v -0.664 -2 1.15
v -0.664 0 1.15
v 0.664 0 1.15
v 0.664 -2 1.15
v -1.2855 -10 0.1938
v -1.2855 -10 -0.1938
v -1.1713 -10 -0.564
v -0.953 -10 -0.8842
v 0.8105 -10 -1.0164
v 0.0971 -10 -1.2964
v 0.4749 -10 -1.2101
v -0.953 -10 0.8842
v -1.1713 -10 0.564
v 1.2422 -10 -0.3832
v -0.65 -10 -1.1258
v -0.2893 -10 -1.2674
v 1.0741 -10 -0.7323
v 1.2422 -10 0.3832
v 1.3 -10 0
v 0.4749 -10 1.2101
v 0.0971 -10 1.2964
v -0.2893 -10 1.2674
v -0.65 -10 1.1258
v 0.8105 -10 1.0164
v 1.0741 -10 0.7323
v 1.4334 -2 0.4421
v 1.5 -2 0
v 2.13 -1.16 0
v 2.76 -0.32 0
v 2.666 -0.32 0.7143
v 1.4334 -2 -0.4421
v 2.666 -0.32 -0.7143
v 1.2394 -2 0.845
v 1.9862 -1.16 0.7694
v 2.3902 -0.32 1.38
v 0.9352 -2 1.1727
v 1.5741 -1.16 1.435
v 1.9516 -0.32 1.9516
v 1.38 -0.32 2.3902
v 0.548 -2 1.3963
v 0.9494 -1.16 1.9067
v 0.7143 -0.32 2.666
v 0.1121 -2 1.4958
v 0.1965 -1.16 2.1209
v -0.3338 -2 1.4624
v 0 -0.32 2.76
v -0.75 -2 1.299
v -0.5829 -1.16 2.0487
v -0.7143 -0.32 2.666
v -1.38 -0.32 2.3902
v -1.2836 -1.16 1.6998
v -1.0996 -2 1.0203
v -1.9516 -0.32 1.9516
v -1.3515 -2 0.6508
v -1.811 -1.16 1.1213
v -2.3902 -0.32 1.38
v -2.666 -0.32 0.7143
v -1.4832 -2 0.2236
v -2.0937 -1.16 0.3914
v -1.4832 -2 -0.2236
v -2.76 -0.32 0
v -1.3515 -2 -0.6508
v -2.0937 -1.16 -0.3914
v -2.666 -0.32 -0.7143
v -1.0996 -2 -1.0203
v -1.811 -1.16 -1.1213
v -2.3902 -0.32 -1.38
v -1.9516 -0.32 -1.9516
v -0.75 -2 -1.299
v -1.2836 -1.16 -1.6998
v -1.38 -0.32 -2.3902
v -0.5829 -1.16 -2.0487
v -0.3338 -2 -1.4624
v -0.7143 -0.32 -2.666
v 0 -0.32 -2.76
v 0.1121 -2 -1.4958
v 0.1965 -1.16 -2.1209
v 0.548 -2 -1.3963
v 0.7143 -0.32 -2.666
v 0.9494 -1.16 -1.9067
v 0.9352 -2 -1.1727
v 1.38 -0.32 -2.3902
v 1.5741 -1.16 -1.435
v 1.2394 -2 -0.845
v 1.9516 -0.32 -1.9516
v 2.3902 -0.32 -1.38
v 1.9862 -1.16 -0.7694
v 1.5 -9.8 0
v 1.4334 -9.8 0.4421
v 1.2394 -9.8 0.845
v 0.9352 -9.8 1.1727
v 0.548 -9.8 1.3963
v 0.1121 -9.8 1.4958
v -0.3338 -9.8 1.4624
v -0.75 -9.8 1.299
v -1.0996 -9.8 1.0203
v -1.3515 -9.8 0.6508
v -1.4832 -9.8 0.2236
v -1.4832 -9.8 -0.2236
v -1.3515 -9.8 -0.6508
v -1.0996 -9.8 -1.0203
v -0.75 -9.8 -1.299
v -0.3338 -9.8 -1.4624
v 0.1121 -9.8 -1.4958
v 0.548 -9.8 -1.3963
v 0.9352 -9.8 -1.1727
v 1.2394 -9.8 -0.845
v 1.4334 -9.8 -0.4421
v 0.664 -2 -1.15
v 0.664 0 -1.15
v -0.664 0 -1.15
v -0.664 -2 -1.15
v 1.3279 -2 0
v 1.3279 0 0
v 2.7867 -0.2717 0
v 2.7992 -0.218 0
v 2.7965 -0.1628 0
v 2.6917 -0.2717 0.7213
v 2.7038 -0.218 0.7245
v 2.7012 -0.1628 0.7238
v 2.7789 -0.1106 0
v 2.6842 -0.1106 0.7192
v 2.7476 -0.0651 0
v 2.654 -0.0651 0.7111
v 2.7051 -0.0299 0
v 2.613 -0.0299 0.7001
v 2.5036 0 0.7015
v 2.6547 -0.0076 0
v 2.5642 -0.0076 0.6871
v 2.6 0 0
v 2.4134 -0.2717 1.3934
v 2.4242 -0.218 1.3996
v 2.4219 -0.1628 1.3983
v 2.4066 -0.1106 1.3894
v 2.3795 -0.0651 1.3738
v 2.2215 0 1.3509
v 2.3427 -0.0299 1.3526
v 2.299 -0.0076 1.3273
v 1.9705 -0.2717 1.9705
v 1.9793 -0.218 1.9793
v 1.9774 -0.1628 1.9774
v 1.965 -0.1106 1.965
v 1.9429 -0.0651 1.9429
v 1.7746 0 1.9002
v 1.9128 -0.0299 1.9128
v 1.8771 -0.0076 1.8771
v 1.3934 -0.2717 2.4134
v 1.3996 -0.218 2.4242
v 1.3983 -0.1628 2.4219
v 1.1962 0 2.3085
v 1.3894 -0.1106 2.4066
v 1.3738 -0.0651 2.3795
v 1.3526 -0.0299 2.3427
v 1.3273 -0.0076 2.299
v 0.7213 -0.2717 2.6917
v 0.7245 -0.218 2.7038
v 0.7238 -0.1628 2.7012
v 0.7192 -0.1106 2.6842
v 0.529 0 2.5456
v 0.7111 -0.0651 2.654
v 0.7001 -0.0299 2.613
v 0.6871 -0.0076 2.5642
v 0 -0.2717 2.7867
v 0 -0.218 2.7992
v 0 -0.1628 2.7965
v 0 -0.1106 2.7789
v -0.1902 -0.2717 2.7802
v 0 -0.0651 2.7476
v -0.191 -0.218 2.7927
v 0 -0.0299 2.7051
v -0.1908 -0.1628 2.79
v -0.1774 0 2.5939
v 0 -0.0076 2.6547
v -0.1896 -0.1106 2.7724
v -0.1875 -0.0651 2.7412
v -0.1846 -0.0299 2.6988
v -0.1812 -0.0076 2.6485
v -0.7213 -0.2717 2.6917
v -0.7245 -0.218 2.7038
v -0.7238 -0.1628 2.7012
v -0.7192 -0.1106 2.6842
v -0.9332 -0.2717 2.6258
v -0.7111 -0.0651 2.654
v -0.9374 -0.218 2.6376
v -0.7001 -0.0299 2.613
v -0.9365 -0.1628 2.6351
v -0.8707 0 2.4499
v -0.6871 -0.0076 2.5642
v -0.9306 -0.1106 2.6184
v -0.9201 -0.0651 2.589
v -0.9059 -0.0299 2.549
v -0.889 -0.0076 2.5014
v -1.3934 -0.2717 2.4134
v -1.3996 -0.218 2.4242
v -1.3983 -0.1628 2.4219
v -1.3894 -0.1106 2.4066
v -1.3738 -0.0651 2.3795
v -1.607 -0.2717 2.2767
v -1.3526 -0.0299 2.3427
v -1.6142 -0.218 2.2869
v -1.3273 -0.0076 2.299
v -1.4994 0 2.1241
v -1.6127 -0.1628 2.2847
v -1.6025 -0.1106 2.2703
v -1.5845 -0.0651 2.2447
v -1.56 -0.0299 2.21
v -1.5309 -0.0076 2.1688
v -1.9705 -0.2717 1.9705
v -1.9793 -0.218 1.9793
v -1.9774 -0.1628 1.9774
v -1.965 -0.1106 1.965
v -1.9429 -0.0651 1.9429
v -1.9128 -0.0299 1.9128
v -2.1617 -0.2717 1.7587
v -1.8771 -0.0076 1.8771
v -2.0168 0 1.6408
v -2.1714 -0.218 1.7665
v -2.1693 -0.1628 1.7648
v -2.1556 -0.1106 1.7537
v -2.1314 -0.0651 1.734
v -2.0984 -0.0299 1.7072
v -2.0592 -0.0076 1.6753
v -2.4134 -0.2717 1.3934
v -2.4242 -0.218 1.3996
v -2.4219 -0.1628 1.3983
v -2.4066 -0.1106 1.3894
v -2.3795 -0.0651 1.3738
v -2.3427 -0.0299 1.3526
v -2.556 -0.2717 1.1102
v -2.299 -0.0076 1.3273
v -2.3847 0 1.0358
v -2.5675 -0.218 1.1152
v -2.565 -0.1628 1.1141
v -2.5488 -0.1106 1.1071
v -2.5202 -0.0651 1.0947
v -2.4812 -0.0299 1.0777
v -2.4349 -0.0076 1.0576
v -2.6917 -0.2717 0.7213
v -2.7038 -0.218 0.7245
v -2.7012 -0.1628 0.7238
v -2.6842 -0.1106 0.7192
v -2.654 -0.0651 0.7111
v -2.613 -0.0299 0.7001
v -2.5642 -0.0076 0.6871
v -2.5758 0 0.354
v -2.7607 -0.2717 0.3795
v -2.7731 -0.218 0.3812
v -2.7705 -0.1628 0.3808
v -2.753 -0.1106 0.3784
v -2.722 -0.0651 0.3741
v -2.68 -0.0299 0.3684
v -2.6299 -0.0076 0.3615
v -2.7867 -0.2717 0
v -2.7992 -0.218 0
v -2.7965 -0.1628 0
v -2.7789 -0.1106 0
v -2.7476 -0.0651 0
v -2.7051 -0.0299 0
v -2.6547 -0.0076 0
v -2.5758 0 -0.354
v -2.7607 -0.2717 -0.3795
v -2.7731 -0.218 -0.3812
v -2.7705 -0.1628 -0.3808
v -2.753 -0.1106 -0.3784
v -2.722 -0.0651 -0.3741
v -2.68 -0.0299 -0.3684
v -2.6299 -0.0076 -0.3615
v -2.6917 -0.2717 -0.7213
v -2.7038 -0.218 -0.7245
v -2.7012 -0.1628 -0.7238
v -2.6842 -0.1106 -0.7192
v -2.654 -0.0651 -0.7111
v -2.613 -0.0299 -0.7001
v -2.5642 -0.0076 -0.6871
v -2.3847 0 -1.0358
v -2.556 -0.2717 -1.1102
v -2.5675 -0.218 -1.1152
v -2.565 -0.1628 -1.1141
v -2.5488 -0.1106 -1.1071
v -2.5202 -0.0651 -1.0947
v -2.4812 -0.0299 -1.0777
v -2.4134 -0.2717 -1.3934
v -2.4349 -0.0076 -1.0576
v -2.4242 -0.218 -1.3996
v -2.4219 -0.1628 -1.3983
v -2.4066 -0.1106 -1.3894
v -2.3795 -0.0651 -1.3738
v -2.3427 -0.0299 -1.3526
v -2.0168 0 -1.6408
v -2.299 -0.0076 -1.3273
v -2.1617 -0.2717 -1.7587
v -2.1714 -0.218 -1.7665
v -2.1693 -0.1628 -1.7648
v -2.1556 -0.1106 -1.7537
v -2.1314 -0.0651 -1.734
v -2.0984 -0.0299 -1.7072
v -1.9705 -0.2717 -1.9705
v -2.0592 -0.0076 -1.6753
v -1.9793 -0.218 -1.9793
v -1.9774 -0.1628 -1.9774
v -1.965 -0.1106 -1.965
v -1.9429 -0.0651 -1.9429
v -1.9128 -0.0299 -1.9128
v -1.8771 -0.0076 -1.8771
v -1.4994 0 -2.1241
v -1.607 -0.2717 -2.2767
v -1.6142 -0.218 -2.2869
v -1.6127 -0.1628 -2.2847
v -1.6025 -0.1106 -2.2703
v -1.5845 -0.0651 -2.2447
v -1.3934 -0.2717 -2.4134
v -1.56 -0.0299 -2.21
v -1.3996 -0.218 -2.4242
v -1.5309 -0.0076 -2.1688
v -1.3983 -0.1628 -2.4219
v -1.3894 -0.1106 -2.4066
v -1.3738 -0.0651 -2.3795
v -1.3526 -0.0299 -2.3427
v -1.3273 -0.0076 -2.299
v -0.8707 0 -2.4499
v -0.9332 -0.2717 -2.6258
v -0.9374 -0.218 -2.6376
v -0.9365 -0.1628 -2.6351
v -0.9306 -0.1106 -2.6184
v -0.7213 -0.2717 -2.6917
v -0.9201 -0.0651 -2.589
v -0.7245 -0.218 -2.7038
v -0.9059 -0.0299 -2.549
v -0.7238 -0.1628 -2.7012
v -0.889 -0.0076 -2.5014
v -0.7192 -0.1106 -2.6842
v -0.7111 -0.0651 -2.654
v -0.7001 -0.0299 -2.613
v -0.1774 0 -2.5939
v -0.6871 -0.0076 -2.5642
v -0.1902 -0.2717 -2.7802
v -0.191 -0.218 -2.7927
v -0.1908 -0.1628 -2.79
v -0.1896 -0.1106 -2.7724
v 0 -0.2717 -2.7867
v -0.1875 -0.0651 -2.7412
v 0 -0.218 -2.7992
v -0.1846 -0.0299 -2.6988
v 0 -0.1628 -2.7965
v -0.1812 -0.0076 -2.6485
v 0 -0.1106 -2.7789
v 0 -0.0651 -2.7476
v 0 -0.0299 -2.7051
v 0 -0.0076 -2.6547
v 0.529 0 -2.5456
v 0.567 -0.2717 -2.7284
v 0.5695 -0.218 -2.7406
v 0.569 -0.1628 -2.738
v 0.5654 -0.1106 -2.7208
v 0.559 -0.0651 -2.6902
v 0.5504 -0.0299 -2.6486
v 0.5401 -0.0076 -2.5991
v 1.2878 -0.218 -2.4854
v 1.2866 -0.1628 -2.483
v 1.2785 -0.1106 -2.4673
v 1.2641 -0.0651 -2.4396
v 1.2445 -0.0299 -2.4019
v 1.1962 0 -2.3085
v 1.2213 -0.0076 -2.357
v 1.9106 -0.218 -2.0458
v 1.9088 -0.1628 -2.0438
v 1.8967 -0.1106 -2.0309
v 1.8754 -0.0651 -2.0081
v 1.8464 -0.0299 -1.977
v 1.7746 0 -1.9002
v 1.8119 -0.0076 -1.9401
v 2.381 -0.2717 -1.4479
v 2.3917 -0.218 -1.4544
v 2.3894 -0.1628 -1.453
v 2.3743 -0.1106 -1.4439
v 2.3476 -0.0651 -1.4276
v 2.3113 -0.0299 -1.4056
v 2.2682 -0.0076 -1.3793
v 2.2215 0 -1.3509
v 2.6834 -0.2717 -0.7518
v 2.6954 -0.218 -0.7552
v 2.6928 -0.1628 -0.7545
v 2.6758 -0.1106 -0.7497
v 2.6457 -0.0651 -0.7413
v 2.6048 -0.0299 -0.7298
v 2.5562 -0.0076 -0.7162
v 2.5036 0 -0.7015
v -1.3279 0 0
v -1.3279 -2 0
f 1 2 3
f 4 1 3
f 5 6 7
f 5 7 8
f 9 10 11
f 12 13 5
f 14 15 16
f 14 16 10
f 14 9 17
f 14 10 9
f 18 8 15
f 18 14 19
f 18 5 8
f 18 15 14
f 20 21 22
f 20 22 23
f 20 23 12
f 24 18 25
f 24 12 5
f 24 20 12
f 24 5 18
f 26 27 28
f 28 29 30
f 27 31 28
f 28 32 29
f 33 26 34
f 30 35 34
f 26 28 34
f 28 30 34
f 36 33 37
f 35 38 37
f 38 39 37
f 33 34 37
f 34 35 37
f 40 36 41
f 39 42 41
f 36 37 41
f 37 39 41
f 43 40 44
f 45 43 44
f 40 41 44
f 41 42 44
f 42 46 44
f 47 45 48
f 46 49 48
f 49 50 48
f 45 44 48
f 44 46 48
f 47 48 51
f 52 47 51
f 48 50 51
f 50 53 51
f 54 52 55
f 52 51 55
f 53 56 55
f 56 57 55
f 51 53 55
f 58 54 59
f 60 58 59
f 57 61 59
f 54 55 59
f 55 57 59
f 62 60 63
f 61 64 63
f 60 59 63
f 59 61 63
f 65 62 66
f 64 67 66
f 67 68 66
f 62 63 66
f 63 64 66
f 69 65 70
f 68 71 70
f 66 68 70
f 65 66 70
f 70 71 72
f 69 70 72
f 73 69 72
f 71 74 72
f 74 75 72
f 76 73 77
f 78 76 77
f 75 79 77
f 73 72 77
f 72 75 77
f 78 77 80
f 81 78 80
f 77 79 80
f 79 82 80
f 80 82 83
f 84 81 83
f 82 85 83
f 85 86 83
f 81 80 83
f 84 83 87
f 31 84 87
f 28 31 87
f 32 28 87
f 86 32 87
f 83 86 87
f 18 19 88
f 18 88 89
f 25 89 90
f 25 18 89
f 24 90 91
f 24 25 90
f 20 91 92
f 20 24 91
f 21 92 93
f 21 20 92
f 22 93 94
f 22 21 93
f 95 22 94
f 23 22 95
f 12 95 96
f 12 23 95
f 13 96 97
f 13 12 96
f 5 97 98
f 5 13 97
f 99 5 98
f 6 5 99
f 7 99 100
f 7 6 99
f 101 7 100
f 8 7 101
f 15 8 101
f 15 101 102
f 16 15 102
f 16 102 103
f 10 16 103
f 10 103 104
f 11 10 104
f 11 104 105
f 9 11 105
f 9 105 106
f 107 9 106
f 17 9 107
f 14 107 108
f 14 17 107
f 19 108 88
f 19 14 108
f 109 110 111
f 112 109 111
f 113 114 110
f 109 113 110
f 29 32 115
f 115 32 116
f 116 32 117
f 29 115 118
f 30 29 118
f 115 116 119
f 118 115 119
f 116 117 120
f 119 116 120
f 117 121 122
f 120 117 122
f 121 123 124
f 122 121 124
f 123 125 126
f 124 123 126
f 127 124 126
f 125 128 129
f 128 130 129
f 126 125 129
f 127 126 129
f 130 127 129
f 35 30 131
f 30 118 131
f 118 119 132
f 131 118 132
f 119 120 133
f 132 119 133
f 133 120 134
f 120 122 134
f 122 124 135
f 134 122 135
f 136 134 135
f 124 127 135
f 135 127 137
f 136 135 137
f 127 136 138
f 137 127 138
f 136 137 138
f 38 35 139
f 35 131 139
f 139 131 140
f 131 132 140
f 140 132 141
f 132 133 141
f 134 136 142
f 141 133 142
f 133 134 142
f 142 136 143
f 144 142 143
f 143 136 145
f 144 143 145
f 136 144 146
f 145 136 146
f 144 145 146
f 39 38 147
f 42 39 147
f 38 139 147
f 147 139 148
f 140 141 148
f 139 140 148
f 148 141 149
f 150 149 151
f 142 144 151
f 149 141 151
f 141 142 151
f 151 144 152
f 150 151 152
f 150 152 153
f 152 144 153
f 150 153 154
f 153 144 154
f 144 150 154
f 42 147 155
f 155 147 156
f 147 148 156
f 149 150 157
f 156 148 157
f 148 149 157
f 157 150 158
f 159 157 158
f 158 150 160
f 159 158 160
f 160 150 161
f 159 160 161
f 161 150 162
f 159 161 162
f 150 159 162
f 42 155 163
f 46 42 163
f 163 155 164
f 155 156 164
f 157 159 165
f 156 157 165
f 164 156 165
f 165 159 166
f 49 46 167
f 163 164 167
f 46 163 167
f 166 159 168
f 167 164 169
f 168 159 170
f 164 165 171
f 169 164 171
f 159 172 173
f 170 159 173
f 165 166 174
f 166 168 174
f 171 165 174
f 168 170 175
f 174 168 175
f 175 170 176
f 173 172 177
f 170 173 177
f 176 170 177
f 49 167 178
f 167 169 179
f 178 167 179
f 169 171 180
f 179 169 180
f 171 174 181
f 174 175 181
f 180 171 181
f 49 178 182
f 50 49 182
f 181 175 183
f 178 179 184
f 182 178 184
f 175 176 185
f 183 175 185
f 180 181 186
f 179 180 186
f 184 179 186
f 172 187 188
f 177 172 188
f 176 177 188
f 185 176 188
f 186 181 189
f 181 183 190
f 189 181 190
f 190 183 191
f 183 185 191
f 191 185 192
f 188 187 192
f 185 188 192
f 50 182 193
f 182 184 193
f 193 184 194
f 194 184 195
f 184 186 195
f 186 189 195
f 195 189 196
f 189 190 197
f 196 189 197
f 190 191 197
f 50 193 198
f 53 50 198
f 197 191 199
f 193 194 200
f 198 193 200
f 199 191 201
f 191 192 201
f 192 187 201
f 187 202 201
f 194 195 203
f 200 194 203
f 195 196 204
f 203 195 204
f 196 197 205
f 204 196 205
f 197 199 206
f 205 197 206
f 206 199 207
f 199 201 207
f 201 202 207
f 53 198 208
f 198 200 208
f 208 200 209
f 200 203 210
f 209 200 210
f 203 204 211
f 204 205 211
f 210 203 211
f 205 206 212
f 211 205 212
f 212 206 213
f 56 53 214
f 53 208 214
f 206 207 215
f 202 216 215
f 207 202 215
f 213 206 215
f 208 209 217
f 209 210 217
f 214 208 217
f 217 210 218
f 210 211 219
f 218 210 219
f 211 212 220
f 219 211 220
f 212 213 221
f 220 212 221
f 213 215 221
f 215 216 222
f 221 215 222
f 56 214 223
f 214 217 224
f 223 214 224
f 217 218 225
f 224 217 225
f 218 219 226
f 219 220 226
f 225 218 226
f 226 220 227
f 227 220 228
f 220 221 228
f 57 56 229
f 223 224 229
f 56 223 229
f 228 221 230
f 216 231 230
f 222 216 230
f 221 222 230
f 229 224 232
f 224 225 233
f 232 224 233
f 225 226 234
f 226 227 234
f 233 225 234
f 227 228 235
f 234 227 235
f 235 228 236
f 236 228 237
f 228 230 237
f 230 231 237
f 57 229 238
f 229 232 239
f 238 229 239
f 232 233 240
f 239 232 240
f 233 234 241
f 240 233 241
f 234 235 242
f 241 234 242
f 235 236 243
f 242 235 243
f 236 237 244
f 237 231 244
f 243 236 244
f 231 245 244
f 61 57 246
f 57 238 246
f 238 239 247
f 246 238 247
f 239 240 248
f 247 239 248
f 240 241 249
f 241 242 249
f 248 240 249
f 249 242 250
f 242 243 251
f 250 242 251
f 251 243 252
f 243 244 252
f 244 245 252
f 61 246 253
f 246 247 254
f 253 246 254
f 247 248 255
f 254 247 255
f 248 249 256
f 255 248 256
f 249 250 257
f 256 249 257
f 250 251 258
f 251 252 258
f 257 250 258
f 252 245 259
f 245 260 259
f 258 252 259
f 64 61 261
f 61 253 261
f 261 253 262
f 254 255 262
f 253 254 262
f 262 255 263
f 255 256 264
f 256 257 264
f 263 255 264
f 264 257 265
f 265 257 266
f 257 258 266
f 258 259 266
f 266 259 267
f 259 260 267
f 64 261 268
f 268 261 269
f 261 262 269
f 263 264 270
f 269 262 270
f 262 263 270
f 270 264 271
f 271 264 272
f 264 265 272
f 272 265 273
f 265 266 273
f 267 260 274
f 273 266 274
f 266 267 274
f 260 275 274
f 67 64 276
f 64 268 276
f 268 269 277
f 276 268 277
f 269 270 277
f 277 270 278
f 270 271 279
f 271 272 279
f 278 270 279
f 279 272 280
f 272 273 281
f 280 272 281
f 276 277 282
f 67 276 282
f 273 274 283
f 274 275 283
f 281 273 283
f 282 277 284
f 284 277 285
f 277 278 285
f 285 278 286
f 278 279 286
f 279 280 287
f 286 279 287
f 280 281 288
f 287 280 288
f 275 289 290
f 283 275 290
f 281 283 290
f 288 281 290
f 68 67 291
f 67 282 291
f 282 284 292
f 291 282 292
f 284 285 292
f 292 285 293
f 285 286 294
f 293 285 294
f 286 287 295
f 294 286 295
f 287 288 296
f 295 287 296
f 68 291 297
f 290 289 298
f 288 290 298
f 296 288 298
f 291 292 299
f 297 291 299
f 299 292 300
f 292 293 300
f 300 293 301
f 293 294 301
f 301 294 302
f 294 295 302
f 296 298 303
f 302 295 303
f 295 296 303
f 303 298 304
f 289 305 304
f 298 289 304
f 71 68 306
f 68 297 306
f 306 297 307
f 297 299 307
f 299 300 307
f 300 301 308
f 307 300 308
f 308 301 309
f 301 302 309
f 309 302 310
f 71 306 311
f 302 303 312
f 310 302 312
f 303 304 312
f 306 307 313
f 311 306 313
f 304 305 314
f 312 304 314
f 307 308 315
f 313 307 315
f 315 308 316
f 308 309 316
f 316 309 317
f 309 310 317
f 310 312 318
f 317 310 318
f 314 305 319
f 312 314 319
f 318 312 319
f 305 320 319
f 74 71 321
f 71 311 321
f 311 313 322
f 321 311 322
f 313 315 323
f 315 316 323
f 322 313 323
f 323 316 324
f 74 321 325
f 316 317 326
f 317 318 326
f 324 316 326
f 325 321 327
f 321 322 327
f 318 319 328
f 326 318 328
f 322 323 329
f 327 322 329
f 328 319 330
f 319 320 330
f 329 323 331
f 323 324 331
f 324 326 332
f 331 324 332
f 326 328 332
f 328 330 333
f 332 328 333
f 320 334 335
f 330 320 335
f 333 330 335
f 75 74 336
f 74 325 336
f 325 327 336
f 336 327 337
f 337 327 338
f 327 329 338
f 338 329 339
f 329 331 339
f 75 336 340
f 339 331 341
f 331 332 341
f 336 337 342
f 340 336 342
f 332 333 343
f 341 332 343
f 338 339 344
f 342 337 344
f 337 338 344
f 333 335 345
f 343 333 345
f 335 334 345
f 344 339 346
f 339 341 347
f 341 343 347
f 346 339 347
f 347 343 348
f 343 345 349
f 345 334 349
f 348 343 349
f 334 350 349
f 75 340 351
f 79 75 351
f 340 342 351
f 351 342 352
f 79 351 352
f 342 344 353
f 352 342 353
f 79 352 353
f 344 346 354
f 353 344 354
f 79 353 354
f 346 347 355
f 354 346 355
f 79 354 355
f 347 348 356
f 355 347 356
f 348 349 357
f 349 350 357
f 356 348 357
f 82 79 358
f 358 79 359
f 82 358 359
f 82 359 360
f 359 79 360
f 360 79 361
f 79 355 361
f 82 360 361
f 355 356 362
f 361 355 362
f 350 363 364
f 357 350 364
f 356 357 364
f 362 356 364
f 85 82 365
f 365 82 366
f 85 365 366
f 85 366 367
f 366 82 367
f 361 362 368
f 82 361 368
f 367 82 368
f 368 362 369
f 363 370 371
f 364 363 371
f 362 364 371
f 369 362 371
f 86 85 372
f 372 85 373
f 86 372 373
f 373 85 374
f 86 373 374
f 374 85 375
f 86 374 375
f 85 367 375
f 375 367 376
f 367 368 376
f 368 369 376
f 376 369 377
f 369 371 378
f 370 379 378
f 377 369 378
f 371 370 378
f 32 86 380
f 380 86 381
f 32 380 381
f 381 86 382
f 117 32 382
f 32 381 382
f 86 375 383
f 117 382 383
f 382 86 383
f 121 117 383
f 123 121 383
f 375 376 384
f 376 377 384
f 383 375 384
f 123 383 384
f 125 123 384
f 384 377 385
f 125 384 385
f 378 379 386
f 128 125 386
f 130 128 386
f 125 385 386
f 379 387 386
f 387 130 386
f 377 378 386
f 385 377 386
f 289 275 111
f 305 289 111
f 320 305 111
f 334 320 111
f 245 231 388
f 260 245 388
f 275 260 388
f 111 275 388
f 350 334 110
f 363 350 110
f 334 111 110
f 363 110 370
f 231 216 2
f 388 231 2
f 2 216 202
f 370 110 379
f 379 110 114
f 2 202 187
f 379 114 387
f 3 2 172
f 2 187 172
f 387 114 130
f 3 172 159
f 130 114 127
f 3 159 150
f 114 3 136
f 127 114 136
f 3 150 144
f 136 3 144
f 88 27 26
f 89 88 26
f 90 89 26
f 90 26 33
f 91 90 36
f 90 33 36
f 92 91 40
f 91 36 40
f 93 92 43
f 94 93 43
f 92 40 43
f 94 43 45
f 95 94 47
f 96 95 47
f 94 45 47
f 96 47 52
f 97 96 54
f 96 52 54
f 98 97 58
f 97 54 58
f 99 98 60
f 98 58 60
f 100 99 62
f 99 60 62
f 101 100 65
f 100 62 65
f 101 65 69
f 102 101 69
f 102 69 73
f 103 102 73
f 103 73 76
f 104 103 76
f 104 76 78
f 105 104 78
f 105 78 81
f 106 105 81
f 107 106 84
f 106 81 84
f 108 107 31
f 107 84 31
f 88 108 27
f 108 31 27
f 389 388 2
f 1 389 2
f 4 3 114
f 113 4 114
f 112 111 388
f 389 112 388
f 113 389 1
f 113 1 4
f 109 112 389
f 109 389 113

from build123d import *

# Parameters (mm, degrees)
SKETCH_2_R          = 1.5
EXTRUDE_1_DEPTH     = 8
CUT_EXTRUDE_1_DEPTH = 2
CHAMFER_1_SIZE      = 0.2
FILLET_1_R          = 0.2


with BuildPart() as part:
    # 草图1 → 旋转1 (revolve)
    with BuildSketch(Plane.XY):
        Polygon((0, 0), (0, -2), (1.5, -2), (3, 0), align=None)
    revolve(axis=Axis((0, 0, 0), (0, -1, 0)))

    # 草图2 → 凸台-拉伸1 (add)
    with BuildSketch(Plane.XZ.offset(2)):
        Circle(SKETCH_2_R)
    extrude(amount=EXTRUDE_1_DEPTH)

    # 草图3 → 切除-拉伸1 (cut)
    with BuildSketch(Plane(origin=(0, 0, 0), x_dir=(1, 0, 0), z_dir=(0, 1, 0))):
        Polygon((-1.327905619, 0), (-0.66395281, -1.15), (0.66395281, -1.15), (1.327905619, 0), (0.66395281, 1.15), (-0.66395281, 1.15), align=None)
    extrude(amount=-CUT_EXTRUDE_1_DEPTH, mode=Mode.SUBTRACT)

    # 倒角1
    chamfer_1_edges = [part.edges().sort_by_distance(p)[0] for p in [
        (-1.5, -10, 0),
    ]]
    chamfer(chamfer_1_edges, length=CHAMFER_1_SIZE)

    # 圆角1
    fillet_1_edges = [part.edges().sort_by_distance(p)[0] for p in [
        (-3, 0, 0),
    ]]
    fillet(fillet_1_edges, radius=FILLET_1_R)


solid = part.part
